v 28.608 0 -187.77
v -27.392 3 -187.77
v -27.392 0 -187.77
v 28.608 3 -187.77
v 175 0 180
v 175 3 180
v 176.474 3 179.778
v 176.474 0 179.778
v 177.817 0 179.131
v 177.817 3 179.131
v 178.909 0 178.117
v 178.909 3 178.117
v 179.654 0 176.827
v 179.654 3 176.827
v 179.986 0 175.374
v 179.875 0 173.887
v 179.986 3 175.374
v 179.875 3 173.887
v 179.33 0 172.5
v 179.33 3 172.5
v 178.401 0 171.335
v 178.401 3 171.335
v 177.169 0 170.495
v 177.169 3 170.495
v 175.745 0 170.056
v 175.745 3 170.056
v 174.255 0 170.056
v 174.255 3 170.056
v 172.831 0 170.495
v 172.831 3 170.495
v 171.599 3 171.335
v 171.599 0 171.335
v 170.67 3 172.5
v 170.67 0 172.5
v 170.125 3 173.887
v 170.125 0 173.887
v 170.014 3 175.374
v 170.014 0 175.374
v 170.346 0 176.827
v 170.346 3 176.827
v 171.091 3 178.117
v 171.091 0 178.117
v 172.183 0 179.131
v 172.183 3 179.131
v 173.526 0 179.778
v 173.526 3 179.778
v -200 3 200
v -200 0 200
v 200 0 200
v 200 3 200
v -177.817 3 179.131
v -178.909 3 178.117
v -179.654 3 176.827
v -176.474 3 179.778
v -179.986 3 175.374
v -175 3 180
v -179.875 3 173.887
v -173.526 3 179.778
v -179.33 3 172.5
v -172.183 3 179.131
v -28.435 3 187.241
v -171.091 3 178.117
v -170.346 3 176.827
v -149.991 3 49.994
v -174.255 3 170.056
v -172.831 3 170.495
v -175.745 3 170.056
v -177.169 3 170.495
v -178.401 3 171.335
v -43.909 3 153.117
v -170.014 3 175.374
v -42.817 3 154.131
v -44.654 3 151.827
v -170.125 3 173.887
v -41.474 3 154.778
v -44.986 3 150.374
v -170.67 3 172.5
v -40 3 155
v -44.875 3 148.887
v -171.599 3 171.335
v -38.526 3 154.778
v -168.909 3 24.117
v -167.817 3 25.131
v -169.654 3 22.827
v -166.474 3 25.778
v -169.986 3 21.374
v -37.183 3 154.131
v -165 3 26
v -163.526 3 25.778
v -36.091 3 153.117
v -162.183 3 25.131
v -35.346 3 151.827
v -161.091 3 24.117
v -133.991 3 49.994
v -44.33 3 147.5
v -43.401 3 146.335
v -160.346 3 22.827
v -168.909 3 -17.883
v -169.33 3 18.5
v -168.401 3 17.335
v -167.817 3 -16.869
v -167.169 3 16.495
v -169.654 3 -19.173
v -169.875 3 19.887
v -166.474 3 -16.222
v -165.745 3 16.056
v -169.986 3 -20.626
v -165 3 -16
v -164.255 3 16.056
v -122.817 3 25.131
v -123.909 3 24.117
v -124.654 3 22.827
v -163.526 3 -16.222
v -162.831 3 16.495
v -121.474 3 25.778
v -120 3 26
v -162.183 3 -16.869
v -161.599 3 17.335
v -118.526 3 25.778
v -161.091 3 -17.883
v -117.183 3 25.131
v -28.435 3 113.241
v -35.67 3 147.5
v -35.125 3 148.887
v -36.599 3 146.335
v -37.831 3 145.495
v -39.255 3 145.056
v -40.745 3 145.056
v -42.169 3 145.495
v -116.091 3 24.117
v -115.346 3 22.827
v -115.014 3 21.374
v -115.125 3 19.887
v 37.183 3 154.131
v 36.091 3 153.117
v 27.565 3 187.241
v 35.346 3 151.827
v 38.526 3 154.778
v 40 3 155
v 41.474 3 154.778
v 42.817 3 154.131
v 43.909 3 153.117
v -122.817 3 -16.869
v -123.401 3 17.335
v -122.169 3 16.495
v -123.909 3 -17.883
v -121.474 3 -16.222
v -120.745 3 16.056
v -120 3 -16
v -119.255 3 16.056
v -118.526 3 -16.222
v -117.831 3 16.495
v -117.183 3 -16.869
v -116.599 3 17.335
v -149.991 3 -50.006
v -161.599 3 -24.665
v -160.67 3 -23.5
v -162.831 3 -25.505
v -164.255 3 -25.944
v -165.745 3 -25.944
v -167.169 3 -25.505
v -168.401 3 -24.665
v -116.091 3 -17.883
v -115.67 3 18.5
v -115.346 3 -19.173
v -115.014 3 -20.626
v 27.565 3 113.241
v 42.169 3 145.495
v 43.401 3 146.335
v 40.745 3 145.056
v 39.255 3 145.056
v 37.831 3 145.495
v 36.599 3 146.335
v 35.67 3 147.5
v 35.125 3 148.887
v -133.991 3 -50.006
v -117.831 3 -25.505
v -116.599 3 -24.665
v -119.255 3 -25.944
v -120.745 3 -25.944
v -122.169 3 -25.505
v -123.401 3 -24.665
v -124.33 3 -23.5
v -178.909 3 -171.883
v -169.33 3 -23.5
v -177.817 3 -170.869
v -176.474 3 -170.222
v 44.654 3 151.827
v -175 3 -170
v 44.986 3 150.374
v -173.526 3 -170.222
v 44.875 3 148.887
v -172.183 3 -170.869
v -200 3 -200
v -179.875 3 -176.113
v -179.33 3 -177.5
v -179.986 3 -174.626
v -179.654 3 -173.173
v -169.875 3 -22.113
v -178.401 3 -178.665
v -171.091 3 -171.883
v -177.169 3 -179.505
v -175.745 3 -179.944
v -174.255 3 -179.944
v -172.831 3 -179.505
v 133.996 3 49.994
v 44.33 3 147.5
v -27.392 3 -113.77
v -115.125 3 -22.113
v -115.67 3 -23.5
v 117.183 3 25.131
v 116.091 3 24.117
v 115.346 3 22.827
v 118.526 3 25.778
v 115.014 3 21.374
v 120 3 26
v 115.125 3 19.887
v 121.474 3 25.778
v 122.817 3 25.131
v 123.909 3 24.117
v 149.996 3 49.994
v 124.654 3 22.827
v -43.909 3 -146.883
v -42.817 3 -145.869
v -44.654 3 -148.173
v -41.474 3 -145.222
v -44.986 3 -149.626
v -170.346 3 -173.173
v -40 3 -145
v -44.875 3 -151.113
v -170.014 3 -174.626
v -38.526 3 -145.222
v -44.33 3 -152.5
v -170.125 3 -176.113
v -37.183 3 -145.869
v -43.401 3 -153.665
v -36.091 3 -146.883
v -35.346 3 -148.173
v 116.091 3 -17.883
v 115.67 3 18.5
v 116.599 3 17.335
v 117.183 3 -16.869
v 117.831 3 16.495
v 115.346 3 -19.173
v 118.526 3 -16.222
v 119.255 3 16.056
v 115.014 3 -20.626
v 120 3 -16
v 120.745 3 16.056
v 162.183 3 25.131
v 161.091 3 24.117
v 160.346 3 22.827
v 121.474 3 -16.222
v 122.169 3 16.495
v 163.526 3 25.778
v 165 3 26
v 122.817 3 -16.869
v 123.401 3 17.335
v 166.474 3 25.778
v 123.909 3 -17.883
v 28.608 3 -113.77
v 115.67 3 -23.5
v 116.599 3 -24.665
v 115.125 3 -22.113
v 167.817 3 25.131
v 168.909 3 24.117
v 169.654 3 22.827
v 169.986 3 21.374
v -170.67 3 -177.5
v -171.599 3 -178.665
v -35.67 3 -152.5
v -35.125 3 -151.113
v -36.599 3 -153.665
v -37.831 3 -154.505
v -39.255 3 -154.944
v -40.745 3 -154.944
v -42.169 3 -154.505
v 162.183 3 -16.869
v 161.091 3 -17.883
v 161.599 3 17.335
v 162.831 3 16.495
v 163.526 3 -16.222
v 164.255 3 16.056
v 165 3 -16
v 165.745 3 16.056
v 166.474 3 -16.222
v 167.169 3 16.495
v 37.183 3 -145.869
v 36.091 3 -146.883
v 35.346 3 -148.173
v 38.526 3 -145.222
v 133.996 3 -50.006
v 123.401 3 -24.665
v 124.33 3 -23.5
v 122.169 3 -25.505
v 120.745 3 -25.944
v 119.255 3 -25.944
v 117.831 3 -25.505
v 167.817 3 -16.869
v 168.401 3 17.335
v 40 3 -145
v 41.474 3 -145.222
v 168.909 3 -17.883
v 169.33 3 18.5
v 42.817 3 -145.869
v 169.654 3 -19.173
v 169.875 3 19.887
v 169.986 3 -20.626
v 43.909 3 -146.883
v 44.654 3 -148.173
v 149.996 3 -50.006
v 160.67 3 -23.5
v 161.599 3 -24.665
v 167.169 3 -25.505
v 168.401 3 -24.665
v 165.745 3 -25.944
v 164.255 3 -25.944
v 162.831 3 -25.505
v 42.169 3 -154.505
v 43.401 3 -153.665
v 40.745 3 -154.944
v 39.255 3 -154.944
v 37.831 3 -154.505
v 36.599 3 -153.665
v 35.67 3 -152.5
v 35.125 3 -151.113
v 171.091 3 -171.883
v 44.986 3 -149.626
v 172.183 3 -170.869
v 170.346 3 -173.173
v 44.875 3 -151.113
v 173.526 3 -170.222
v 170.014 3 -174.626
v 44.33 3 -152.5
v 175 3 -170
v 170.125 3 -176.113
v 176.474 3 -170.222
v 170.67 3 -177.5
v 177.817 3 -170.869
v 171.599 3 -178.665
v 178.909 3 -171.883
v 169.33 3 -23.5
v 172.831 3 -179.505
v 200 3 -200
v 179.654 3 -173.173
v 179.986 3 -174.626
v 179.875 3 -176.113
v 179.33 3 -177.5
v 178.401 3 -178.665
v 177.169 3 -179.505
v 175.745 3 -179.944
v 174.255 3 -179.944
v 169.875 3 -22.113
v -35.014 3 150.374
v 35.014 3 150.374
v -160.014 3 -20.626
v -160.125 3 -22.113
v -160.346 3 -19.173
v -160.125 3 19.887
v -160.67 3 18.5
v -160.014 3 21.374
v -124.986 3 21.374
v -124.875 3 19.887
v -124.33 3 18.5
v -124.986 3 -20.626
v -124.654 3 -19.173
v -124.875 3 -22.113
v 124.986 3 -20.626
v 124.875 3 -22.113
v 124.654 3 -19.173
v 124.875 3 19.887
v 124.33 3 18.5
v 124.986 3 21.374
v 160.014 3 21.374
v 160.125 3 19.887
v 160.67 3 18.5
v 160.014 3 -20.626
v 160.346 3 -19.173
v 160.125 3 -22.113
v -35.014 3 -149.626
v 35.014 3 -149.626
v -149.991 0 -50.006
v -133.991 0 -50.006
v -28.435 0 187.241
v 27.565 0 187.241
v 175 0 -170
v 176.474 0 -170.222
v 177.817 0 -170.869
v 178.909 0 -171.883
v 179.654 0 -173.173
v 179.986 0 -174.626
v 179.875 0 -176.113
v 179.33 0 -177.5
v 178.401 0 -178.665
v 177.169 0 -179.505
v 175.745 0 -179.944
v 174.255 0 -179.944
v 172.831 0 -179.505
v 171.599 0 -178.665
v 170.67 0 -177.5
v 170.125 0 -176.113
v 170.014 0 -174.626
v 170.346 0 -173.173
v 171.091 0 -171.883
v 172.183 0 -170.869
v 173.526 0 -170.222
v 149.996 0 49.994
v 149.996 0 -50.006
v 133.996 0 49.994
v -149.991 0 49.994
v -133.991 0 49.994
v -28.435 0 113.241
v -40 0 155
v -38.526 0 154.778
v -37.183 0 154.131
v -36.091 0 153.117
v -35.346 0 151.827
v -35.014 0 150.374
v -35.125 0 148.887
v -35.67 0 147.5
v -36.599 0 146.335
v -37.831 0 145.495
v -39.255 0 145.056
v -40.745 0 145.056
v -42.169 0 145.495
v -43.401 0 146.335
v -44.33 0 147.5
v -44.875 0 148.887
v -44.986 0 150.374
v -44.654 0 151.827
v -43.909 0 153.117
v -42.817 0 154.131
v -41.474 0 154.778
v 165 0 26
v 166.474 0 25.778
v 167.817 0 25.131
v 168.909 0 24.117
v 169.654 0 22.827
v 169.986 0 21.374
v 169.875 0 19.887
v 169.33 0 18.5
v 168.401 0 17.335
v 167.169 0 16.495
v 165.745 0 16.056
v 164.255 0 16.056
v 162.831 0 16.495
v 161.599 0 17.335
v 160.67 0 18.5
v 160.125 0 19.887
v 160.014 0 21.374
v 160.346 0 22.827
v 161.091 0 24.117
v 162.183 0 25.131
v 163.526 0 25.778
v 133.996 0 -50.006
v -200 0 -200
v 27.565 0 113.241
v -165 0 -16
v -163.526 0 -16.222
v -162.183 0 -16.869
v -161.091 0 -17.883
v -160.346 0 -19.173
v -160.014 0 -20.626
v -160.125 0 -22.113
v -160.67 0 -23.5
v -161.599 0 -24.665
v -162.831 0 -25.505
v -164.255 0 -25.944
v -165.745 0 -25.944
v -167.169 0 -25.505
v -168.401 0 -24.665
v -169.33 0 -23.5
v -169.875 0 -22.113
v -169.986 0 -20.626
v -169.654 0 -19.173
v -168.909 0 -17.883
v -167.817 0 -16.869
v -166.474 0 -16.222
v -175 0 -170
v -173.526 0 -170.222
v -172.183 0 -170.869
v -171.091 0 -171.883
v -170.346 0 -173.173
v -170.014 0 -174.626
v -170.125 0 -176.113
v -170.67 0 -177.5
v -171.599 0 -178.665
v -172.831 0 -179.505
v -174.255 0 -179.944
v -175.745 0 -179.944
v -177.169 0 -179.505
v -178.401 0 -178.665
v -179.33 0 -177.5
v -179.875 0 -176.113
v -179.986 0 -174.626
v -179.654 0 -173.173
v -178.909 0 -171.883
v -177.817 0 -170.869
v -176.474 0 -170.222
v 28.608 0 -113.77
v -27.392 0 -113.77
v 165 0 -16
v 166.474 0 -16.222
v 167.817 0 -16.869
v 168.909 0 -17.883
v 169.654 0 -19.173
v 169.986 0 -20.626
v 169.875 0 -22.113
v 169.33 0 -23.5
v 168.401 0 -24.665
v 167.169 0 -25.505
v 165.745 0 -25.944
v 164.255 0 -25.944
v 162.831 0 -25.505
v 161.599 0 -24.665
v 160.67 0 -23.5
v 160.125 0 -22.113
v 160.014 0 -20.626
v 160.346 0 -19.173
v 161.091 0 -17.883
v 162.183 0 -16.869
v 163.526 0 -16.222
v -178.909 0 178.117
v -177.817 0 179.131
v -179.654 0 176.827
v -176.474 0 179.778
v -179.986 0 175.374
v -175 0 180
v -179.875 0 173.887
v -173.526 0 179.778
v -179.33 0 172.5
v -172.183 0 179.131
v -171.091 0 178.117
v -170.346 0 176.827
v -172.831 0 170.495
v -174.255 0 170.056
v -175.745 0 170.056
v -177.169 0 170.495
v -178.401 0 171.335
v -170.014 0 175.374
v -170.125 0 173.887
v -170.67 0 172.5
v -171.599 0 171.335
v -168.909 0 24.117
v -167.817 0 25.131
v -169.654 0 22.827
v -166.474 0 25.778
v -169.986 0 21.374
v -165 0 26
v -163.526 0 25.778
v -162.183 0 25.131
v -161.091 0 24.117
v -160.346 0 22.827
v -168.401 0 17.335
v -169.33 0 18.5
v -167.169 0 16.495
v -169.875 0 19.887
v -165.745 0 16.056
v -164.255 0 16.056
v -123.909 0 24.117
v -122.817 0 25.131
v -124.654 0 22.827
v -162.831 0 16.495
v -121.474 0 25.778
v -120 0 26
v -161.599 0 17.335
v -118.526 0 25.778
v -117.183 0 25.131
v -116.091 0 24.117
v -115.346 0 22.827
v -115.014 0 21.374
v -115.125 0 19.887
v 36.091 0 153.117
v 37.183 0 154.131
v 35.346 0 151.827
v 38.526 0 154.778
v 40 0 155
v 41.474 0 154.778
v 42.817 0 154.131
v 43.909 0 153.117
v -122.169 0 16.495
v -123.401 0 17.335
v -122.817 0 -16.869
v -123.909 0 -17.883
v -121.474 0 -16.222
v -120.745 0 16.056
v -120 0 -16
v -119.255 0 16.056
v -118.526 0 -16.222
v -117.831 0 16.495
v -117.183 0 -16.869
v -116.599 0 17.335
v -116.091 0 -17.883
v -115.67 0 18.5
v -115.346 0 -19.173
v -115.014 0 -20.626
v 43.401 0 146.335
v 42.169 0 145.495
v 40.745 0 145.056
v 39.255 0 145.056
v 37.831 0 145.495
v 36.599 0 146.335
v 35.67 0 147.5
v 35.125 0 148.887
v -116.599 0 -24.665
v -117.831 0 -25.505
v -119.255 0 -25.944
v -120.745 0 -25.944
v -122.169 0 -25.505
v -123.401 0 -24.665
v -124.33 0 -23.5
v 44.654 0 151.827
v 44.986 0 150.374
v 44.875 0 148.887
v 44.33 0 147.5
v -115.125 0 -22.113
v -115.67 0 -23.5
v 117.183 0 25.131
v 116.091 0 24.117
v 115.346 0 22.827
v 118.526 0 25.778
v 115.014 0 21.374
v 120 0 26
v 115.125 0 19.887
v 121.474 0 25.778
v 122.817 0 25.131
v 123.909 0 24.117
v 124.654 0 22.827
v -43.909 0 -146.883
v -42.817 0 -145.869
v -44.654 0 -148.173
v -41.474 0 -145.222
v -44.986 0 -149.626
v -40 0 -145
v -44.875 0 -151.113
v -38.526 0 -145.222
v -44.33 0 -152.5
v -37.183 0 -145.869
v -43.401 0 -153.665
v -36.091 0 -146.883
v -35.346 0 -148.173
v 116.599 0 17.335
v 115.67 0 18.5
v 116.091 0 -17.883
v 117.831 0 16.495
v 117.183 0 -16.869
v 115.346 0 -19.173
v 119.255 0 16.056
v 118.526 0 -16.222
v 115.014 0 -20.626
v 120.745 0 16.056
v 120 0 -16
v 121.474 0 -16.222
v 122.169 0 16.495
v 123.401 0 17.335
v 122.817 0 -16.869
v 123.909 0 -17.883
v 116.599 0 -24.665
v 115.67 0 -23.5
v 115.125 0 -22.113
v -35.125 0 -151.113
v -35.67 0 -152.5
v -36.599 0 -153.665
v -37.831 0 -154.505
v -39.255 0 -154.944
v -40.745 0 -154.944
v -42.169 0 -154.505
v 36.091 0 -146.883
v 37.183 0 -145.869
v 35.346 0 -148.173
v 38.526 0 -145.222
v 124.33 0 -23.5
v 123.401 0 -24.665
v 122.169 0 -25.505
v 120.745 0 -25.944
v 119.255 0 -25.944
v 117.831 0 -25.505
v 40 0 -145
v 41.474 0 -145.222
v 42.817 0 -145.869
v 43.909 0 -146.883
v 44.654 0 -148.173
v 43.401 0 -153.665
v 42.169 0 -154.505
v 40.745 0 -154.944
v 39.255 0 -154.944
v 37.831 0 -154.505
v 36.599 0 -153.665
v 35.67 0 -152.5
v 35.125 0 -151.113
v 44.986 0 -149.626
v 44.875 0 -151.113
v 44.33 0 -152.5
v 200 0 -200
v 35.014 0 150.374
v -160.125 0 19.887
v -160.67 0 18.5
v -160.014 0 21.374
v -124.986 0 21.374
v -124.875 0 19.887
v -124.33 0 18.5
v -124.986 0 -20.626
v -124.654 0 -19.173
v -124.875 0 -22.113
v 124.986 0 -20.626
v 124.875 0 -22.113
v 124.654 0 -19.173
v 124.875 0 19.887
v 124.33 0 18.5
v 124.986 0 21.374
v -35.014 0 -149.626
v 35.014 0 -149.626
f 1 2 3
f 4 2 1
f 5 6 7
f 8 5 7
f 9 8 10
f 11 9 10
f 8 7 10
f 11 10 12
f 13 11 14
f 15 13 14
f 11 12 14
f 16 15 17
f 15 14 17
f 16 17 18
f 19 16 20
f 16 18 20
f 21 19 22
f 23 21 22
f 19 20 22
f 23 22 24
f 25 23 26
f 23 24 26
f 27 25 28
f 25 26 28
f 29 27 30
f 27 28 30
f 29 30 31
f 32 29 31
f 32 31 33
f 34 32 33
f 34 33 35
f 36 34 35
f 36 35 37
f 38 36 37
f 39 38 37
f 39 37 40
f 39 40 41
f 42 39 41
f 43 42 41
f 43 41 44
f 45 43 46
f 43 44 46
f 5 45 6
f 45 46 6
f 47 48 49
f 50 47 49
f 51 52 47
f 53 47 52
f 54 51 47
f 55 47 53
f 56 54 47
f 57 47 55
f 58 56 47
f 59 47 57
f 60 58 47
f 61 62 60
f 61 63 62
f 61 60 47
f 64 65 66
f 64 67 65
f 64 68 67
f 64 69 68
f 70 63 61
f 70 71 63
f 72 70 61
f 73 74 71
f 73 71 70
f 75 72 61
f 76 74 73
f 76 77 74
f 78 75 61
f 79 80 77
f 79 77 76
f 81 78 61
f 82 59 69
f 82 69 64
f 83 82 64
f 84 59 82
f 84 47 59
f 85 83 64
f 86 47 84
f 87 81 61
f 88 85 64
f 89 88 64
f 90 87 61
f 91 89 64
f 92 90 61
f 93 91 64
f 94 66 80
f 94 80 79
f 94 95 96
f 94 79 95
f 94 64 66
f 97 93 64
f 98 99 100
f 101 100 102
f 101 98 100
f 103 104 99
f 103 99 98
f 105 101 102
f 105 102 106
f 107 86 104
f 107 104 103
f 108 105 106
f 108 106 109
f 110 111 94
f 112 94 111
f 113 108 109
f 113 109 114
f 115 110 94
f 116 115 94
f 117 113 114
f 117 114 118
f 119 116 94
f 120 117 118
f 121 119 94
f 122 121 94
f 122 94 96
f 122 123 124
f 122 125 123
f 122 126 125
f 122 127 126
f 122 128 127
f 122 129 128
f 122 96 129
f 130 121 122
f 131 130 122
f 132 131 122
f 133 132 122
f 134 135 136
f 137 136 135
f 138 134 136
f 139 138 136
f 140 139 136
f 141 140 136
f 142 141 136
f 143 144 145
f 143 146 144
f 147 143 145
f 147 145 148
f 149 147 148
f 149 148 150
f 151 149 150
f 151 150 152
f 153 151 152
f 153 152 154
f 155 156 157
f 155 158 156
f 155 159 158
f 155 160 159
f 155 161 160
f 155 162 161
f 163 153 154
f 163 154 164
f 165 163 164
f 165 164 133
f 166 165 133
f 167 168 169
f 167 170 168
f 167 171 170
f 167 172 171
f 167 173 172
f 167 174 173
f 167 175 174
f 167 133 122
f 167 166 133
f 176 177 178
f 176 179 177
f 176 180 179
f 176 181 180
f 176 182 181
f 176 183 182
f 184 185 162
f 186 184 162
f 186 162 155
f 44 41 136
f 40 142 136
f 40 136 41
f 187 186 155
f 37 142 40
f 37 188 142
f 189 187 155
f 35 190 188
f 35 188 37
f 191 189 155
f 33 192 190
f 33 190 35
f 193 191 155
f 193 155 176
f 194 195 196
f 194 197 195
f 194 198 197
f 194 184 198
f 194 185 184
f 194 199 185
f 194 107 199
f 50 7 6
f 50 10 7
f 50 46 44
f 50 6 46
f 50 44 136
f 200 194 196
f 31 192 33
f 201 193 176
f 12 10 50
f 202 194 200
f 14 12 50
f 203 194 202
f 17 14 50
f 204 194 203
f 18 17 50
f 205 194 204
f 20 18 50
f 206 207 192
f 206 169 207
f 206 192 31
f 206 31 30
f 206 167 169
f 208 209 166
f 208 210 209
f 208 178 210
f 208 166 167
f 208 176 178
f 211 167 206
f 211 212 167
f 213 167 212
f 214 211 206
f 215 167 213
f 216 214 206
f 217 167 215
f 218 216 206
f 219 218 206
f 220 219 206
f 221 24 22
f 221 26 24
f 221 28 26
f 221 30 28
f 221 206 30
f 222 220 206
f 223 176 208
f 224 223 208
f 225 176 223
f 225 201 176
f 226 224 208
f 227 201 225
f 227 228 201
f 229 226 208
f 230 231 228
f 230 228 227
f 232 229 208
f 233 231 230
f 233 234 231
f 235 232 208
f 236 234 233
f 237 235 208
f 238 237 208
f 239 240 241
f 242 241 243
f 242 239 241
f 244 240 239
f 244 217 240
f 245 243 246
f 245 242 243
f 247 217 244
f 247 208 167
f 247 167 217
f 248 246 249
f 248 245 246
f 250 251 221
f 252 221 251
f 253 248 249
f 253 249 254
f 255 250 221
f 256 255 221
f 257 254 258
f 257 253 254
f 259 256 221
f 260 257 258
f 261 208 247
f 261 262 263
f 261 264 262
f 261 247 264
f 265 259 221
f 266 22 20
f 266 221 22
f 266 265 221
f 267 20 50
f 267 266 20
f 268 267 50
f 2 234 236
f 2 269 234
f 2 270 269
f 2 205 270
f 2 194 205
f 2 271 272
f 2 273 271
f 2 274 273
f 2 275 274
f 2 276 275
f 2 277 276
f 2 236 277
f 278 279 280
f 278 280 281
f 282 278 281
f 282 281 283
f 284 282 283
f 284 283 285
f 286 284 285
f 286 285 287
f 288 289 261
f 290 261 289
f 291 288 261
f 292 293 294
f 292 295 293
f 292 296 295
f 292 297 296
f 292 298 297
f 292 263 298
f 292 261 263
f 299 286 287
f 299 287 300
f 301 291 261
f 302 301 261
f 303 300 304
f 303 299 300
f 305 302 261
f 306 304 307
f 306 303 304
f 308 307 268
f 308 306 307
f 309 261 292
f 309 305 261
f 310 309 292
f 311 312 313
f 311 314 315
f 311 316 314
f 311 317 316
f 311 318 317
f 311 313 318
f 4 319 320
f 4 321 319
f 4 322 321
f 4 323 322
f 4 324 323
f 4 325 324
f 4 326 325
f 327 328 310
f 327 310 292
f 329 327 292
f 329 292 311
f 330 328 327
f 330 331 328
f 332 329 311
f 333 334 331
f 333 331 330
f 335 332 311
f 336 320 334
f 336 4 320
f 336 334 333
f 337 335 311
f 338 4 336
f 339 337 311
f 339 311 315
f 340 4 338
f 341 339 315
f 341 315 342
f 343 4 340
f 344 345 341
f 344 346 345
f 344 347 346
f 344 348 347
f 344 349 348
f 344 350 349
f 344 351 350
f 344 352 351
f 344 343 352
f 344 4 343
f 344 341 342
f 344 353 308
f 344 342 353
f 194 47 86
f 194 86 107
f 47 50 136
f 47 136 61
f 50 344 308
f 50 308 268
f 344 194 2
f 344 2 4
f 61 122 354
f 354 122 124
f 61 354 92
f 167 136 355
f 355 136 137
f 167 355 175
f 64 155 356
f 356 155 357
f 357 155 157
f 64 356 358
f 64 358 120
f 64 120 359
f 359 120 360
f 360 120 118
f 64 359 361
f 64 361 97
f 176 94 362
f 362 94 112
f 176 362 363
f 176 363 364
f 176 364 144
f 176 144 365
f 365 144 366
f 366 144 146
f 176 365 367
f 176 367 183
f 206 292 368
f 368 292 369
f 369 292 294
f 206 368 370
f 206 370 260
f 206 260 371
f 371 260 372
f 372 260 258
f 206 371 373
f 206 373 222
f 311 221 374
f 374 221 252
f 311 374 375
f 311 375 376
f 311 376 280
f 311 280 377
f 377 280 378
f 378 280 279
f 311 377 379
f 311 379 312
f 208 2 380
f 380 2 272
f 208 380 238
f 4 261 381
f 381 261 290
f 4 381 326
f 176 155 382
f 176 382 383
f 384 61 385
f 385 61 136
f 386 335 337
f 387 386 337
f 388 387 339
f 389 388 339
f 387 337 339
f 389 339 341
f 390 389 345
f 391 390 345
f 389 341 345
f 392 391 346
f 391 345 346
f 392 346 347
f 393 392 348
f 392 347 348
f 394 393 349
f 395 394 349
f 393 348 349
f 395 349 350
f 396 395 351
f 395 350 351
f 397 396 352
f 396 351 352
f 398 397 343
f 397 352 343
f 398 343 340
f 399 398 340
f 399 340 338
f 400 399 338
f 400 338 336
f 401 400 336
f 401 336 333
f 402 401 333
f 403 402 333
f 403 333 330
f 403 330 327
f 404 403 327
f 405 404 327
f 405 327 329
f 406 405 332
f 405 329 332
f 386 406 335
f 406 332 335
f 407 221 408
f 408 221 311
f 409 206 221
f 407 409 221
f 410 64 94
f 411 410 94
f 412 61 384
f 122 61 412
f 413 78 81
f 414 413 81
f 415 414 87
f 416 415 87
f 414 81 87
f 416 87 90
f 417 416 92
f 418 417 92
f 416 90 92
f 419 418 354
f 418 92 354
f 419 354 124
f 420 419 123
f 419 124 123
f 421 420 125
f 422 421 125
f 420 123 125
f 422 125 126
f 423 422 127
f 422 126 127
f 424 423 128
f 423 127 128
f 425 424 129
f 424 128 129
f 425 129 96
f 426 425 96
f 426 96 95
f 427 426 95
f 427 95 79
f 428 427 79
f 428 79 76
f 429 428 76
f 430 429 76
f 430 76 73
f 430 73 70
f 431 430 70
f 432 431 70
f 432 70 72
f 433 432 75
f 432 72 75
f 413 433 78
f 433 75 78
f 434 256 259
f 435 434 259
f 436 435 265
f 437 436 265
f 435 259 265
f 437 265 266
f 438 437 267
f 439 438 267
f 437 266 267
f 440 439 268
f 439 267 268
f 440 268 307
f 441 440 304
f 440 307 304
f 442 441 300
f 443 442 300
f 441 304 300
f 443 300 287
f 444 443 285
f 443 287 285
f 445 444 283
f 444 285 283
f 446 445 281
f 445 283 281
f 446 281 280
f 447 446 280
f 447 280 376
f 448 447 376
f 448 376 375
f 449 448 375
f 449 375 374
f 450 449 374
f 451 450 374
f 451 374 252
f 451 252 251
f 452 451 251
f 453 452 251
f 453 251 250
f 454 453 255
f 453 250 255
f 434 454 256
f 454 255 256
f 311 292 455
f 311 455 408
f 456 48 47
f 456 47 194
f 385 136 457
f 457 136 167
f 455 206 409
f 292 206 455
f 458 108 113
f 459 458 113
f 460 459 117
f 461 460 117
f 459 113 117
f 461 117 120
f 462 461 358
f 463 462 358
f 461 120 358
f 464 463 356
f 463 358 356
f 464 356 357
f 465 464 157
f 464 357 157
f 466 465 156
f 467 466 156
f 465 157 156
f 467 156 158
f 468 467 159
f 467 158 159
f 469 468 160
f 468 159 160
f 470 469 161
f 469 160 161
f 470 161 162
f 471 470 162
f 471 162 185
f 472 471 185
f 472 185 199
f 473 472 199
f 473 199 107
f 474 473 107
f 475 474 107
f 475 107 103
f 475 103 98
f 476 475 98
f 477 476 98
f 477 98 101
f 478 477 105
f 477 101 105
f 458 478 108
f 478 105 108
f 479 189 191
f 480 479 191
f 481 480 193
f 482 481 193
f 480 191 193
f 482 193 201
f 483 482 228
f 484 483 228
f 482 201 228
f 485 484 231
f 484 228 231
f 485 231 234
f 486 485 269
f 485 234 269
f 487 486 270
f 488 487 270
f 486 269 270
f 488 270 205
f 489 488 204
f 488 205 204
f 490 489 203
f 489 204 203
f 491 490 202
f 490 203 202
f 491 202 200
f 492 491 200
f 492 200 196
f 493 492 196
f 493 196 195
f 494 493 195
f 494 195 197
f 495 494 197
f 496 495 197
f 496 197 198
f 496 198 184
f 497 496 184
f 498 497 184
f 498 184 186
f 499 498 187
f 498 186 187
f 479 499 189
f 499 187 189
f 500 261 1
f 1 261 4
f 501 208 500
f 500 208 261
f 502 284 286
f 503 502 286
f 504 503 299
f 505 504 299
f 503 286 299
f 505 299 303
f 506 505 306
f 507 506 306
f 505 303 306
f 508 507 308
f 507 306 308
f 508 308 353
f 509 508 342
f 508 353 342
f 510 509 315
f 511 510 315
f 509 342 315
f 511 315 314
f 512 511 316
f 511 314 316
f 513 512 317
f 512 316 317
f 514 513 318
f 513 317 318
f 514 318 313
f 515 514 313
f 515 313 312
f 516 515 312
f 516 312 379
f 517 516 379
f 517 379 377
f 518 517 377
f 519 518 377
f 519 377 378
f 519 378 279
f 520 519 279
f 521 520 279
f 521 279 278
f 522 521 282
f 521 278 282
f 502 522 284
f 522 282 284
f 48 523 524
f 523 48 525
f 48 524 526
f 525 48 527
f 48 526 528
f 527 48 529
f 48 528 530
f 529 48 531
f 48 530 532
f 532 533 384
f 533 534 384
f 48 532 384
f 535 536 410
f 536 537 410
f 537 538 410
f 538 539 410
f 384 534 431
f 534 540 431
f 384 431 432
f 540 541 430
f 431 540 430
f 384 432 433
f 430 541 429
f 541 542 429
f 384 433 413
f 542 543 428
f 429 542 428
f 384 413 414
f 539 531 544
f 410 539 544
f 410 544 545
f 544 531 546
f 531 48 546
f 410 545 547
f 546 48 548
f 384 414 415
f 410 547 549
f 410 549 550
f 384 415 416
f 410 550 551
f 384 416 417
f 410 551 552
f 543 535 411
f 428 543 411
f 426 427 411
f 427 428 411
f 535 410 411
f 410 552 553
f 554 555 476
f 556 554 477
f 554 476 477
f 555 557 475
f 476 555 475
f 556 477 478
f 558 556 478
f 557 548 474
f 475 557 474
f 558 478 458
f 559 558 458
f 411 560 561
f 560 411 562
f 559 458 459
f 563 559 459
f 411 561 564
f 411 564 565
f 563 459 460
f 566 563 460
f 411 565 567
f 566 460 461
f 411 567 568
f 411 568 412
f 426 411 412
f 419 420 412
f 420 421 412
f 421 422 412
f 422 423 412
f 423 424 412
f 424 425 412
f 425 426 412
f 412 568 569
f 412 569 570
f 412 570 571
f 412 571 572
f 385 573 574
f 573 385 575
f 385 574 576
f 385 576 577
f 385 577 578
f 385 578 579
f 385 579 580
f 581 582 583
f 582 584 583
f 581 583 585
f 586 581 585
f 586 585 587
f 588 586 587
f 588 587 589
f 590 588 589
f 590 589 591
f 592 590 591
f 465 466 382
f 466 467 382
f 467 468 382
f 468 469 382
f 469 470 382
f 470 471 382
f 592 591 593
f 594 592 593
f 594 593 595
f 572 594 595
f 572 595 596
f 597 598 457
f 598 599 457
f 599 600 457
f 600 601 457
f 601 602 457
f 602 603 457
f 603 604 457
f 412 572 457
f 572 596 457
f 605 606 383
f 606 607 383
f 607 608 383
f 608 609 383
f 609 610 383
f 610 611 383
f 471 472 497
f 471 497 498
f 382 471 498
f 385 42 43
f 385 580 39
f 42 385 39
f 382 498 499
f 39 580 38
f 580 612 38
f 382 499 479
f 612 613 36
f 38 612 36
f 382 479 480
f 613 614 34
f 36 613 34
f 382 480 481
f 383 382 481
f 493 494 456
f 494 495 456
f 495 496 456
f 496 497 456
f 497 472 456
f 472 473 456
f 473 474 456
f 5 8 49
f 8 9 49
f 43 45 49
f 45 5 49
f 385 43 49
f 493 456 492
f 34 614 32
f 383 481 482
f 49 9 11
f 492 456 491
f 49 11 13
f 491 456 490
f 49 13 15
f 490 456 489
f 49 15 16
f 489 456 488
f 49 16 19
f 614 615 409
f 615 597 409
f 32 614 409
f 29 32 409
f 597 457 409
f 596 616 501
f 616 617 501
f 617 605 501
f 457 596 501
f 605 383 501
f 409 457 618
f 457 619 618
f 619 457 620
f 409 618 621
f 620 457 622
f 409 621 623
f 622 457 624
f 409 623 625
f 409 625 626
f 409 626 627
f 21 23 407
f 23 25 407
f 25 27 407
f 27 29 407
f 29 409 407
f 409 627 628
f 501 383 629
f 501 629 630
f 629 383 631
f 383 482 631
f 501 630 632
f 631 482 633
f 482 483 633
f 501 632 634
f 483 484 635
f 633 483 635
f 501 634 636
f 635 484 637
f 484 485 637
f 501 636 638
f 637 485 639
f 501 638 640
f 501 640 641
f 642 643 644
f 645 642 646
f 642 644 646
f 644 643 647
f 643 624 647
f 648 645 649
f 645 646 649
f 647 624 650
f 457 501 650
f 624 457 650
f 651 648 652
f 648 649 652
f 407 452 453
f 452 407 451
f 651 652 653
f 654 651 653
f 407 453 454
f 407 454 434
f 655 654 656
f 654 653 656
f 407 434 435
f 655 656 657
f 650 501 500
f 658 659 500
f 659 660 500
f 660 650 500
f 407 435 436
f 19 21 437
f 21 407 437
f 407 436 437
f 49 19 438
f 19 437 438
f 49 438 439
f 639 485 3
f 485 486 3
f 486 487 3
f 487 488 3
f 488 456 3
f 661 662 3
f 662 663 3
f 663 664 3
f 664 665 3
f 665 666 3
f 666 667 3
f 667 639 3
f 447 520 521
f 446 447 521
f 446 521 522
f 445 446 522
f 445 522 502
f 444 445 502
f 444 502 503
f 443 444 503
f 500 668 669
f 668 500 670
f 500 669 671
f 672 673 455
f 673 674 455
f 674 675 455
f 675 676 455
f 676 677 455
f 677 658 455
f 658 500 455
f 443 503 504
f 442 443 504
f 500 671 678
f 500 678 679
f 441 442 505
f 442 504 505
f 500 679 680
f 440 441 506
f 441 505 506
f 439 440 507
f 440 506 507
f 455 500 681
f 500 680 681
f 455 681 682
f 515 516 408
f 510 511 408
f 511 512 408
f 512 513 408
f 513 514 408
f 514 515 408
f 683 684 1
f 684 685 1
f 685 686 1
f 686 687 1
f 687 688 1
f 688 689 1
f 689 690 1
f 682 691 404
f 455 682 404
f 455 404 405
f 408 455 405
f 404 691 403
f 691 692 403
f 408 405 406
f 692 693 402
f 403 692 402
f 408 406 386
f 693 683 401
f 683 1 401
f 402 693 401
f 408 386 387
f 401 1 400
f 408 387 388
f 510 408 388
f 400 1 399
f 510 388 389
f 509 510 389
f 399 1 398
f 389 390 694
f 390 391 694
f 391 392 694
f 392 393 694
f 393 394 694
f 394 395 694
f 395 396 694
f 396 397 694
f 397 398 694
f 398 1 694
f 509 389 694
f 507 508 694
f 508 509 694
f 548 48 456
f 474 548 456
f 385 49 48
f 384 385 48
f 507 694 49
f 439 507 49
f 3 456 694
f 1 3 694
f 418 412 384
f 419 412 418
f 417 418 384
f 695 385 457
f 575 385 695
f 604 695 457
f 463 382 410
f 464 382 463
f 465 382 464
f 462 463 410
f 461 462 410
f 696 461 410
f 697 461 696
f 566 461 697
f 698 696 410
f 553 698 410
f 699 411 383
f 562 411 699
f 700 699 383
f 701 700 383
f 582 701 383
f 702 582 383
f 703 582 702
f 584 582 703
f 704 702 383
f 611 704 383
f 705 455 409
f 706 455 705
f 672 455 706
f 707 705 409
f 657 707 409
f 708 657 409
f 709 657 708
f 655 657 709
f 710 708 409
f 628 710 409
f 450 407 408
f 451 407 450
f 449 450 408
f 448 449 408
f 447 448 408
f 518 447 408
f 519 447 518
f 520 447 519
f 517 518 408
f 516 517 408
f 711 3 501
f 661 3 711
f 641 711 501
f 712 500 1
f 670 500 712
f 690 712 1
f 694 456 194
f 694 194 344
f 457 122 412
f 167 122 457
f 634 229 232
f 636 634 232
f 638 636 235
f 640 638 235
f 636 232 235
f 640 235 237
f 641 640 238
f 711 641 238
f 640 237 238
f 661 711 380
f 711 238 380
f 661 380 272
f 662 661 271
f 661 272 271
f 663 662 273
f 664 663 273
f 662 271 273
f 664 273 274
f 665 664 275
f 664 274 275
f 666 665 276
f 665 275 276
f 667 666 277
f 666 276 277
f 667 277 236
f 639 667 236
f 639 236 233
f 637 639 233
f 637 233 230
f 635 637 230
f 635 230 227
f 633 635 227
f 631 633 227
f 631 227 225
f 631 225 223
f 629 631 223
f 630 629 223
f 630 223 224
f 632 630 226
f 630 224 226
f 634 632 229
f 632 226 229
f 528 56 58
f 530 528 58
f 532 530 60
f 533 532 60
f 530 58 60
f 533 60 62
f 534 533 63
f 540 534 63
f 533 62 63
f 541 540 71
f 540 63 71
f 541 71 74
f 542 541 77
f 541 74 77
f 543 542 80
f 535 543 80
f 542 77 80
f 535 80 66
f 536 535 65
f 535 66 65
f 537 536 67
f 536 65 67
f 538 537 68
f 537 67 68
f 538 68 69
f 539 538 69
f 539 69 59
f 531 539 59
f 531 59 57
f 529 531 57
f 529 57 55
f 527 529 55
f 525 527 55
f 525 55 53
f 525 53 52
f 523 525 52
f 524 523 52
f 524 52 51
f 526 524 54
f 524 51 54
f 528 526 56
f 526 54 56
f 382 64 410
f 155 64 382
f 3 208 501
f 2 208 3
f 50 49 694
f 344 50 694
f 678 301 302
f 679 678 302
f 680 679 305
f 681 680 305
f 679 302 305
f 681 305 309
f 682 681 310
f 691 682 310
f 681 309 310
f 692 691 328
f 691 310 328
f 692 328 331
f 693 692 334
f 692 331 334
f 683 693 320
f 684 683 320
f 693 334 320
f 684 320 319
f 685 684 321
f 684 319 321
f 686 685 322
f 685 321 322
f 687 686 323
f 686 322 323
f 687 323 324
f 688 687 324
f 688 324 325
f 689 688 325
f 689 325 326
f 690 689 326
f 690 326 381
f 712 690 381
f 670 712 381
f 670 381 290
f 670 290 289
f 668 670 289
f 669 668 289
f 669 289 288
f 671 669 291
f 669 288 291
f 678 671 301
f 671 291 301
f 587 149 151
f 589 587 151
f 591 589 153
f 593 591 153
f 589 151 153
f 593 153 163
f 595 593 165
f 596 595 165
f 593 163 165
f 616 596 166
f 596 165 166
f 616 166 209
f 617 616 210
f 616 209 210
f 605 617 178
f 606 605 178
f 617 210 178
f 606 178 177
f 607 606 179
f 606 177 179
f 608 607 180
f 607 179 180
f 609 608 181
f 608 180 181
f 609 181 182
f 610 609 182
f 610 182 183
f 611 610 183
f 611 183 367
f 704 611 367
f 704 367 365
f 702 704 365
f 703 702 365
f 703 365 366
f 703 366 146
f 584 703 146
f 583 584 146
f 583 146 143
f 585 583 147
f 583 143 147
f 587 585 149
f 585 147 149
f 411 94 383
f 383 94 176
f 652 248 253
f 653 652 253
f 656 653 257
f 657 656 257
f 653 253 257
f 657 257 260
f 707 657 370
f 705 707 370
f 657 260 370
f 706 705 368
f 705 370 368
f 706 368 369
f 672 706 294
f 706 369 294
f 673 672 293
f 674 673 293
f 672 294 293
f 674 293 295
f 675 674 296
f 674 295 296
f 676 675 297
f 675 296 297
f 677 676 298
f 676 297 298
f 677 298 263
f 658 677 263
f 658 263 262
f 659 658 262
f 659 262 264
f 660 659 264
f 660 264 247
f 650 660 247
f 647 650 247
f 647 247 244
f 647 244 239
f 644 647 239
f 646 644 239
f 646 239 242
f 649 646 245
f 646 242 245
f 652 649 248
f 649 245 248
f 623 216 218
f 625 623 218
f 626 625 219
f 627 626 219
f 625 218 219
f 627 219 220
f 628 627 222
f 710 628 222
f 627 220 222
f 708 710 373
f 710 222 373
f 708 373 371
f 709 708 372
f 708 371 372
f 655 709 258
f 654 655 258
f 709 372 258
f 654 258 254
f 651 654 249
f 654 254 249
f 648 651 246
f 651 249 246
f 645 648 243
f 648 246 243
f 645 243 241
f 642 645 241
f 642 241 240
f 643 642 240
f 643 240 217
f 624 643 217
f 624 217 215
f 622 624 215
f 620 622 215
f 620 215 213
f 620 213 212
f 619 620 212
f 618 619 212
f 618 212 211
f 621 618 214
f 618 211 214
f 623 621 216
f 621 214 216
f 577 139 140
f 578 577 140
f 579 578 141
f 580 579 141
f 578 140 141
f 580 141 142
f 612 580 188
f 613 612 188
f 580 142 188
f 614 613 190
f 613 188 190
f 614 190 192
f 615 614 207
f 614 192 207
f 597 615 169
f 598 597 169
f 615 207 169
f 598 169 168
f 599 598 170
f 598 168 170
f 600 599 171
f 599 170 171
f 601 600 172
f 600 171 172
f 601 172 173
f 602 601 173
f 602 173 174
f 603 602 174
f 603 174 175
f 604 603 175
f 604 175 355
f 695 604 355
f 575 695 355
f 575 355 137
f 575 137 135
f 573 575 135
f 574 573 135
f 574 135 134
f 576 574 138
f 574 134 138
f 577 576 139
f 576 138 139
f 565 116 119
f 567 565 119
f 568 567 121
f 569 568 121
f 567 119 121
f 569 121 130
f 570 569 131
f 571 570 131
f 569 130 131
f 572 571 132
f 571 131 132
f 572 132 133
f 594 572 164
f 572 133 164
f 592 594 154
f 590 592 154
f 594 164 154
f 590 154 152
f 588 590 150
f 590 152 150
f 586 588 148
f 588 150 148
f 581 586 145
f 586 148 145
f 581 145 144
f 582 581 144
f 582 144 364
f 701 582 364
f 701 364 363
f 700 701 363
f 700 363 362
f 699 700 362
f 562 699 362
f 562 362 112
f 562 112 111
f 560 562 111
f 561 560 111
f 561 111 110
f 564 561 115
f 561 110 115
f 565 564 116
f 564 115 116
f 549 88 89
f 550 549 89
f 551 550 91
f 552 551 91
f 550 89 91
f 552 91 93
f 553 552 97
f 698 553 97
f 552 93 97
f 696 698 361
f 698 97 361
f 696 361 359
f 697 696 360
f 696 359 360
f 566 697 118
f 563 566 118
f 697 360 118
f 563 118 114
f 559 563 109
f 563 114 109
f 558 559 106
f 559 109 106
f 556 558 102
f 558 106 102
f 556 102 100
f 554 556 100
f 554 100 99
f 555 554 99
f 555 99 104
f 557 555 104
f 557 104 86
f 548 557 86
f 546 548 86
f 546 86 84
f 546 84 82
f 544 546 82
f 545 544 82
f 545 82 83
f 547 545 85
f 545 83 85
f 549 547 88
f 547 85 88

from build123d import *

# Parameters (mm, degrees)
SKETCH1_W           = 400
SKETCH1_H           = 400
BOSS_EXTRUDE1_DEPTH = 3
SKETCH3_W           = 16
SKETCH3_H           = 100
CUT_EXTRUDE1_DEPTH  = 3
SKETCH4_W           = 56
SKETCH4_H           = 74
CUT_EXTRUDE2_DEPTH  = 3
SKETCH5_R           = 5
CUT_EXTRUDE3_DEPTH  = 3


with BuildPart() as part:
    # Sketch1 → Boss-Extrude1 (new body)
    with BuildSketch(Plane(origin=(0, 0, 0), x_dir=(1, 0, 0), z_dir=(0, 1, 0))):
        Rectangle(SKETCH1_W, SKETCH1_H)
    extrude(amount=BOSS_EXTRUDE1_DEPTH)

    # Sketch3 → Cut-Extrude1 (cut)
    with BuildSketch(Plane(origin=(0, 3, 0), x_dir=(1, 0, 0), z_dir=(0, 1, 0))):
        with Locations((-141.990723633, 0.005834667)):
            Rectangle(SKETCH3_W, SKETCH3_H)
        with Locations((141.996469981, 0.005657447)):
            Rectangle(SKETCH3_W, SKETCH3_H)
    extrude(amount=-CUT_EXTRUDE1_DEPTH, mode=Mode.SUBTRACT)

    # Sketch4 → Cut-Extrude2 (cut)
    with BuildSketch(Plane(origin=(0, 3, 0), x_dir=(1, 0, 0), z_dir=(0, 1, 0))):
        with Locations((0.607935106, 150.770035388)):
            Rectangle(SKETCH4_W, SKETCH4_H)
        with Locations((-0.434902884, -150.241190723)):
            Rectangle(SKETCH4_W, SKETCH4_H)
    extrude(amount=-CUT_EXTRUDE2_DEPTH, mode=Mode.SUBTRACT)

    # Sketch5 → Cut-Extrude3 (cut)
    with BuildSketch(Plane(origin=(0, 3, 0), x_dir=(1, 0, 0), z_dir=(0, 1, 0))):
        with Locations(Location((-165, 21, 0), (0, 0, 270))):
            Circle(SKETCH5_R)
        with Locations(Location((-165, -21, 0), (0, 0, 270))):
            Circle(SKETCH5_R)
        with Locations(Location((-120, 21, 0), (0, 0, 270))):
            Circle(SKETCH5_R)
        with Locations(Location((-120, -21, 0), (0, 0, 270))):
            Circle(SKETCH5_R)
        with Locations(Location((165, 21, 0), (0, 0, 270))):
            Circle(SKETCH5_R)
        with Locations(Location((165, -21, 0), (0, 0, 270))):
            Circle(SKETCH5_R)
        with Locations(Location((120, 21, 0), (0, 0, 270))):
            Circle(SKETCH5_R)
        with Locations(Location((120, -21, 0), (0, 0, 270))):
            Circle(SKETCH5_R)
        with Locations(Location((-40, -150, 0), (0, 0, 270))):
            Circle(SKETCH5_R)
        with Locations(Location((40, -150, 0), (0, 0, 270))):
            Circle(SKETCH5_R)
        with Locations(Location((-40, 150, 0), (0, 0, 270))):
            Circle(SKETCH5_R)
        with Locations(Location((40, 150, 0), (0, 0, 270))):
            Circle(SKETCH5_R)
        with Locations(Location((-175, 175, 0), (0, 0, 270))):
            Circle(SKETCH5_R)
        with Locations(Location((175, 175, 0), (0, 0, 270))):
            Circle(SKETCH5_R)
        with Locations(Location((175, -175, 0), (0, 0, 270))):
            Circle(SKETCH5_R)
        with Locations(Location((-175, -175, 0), (0, 0, 270))):
            Circle(SKETCH5_R)
    extrude(amount=-CUT_EXTRUDE3_DEPTH, mode=Mode.SUBTRACT)


solid = part.part
